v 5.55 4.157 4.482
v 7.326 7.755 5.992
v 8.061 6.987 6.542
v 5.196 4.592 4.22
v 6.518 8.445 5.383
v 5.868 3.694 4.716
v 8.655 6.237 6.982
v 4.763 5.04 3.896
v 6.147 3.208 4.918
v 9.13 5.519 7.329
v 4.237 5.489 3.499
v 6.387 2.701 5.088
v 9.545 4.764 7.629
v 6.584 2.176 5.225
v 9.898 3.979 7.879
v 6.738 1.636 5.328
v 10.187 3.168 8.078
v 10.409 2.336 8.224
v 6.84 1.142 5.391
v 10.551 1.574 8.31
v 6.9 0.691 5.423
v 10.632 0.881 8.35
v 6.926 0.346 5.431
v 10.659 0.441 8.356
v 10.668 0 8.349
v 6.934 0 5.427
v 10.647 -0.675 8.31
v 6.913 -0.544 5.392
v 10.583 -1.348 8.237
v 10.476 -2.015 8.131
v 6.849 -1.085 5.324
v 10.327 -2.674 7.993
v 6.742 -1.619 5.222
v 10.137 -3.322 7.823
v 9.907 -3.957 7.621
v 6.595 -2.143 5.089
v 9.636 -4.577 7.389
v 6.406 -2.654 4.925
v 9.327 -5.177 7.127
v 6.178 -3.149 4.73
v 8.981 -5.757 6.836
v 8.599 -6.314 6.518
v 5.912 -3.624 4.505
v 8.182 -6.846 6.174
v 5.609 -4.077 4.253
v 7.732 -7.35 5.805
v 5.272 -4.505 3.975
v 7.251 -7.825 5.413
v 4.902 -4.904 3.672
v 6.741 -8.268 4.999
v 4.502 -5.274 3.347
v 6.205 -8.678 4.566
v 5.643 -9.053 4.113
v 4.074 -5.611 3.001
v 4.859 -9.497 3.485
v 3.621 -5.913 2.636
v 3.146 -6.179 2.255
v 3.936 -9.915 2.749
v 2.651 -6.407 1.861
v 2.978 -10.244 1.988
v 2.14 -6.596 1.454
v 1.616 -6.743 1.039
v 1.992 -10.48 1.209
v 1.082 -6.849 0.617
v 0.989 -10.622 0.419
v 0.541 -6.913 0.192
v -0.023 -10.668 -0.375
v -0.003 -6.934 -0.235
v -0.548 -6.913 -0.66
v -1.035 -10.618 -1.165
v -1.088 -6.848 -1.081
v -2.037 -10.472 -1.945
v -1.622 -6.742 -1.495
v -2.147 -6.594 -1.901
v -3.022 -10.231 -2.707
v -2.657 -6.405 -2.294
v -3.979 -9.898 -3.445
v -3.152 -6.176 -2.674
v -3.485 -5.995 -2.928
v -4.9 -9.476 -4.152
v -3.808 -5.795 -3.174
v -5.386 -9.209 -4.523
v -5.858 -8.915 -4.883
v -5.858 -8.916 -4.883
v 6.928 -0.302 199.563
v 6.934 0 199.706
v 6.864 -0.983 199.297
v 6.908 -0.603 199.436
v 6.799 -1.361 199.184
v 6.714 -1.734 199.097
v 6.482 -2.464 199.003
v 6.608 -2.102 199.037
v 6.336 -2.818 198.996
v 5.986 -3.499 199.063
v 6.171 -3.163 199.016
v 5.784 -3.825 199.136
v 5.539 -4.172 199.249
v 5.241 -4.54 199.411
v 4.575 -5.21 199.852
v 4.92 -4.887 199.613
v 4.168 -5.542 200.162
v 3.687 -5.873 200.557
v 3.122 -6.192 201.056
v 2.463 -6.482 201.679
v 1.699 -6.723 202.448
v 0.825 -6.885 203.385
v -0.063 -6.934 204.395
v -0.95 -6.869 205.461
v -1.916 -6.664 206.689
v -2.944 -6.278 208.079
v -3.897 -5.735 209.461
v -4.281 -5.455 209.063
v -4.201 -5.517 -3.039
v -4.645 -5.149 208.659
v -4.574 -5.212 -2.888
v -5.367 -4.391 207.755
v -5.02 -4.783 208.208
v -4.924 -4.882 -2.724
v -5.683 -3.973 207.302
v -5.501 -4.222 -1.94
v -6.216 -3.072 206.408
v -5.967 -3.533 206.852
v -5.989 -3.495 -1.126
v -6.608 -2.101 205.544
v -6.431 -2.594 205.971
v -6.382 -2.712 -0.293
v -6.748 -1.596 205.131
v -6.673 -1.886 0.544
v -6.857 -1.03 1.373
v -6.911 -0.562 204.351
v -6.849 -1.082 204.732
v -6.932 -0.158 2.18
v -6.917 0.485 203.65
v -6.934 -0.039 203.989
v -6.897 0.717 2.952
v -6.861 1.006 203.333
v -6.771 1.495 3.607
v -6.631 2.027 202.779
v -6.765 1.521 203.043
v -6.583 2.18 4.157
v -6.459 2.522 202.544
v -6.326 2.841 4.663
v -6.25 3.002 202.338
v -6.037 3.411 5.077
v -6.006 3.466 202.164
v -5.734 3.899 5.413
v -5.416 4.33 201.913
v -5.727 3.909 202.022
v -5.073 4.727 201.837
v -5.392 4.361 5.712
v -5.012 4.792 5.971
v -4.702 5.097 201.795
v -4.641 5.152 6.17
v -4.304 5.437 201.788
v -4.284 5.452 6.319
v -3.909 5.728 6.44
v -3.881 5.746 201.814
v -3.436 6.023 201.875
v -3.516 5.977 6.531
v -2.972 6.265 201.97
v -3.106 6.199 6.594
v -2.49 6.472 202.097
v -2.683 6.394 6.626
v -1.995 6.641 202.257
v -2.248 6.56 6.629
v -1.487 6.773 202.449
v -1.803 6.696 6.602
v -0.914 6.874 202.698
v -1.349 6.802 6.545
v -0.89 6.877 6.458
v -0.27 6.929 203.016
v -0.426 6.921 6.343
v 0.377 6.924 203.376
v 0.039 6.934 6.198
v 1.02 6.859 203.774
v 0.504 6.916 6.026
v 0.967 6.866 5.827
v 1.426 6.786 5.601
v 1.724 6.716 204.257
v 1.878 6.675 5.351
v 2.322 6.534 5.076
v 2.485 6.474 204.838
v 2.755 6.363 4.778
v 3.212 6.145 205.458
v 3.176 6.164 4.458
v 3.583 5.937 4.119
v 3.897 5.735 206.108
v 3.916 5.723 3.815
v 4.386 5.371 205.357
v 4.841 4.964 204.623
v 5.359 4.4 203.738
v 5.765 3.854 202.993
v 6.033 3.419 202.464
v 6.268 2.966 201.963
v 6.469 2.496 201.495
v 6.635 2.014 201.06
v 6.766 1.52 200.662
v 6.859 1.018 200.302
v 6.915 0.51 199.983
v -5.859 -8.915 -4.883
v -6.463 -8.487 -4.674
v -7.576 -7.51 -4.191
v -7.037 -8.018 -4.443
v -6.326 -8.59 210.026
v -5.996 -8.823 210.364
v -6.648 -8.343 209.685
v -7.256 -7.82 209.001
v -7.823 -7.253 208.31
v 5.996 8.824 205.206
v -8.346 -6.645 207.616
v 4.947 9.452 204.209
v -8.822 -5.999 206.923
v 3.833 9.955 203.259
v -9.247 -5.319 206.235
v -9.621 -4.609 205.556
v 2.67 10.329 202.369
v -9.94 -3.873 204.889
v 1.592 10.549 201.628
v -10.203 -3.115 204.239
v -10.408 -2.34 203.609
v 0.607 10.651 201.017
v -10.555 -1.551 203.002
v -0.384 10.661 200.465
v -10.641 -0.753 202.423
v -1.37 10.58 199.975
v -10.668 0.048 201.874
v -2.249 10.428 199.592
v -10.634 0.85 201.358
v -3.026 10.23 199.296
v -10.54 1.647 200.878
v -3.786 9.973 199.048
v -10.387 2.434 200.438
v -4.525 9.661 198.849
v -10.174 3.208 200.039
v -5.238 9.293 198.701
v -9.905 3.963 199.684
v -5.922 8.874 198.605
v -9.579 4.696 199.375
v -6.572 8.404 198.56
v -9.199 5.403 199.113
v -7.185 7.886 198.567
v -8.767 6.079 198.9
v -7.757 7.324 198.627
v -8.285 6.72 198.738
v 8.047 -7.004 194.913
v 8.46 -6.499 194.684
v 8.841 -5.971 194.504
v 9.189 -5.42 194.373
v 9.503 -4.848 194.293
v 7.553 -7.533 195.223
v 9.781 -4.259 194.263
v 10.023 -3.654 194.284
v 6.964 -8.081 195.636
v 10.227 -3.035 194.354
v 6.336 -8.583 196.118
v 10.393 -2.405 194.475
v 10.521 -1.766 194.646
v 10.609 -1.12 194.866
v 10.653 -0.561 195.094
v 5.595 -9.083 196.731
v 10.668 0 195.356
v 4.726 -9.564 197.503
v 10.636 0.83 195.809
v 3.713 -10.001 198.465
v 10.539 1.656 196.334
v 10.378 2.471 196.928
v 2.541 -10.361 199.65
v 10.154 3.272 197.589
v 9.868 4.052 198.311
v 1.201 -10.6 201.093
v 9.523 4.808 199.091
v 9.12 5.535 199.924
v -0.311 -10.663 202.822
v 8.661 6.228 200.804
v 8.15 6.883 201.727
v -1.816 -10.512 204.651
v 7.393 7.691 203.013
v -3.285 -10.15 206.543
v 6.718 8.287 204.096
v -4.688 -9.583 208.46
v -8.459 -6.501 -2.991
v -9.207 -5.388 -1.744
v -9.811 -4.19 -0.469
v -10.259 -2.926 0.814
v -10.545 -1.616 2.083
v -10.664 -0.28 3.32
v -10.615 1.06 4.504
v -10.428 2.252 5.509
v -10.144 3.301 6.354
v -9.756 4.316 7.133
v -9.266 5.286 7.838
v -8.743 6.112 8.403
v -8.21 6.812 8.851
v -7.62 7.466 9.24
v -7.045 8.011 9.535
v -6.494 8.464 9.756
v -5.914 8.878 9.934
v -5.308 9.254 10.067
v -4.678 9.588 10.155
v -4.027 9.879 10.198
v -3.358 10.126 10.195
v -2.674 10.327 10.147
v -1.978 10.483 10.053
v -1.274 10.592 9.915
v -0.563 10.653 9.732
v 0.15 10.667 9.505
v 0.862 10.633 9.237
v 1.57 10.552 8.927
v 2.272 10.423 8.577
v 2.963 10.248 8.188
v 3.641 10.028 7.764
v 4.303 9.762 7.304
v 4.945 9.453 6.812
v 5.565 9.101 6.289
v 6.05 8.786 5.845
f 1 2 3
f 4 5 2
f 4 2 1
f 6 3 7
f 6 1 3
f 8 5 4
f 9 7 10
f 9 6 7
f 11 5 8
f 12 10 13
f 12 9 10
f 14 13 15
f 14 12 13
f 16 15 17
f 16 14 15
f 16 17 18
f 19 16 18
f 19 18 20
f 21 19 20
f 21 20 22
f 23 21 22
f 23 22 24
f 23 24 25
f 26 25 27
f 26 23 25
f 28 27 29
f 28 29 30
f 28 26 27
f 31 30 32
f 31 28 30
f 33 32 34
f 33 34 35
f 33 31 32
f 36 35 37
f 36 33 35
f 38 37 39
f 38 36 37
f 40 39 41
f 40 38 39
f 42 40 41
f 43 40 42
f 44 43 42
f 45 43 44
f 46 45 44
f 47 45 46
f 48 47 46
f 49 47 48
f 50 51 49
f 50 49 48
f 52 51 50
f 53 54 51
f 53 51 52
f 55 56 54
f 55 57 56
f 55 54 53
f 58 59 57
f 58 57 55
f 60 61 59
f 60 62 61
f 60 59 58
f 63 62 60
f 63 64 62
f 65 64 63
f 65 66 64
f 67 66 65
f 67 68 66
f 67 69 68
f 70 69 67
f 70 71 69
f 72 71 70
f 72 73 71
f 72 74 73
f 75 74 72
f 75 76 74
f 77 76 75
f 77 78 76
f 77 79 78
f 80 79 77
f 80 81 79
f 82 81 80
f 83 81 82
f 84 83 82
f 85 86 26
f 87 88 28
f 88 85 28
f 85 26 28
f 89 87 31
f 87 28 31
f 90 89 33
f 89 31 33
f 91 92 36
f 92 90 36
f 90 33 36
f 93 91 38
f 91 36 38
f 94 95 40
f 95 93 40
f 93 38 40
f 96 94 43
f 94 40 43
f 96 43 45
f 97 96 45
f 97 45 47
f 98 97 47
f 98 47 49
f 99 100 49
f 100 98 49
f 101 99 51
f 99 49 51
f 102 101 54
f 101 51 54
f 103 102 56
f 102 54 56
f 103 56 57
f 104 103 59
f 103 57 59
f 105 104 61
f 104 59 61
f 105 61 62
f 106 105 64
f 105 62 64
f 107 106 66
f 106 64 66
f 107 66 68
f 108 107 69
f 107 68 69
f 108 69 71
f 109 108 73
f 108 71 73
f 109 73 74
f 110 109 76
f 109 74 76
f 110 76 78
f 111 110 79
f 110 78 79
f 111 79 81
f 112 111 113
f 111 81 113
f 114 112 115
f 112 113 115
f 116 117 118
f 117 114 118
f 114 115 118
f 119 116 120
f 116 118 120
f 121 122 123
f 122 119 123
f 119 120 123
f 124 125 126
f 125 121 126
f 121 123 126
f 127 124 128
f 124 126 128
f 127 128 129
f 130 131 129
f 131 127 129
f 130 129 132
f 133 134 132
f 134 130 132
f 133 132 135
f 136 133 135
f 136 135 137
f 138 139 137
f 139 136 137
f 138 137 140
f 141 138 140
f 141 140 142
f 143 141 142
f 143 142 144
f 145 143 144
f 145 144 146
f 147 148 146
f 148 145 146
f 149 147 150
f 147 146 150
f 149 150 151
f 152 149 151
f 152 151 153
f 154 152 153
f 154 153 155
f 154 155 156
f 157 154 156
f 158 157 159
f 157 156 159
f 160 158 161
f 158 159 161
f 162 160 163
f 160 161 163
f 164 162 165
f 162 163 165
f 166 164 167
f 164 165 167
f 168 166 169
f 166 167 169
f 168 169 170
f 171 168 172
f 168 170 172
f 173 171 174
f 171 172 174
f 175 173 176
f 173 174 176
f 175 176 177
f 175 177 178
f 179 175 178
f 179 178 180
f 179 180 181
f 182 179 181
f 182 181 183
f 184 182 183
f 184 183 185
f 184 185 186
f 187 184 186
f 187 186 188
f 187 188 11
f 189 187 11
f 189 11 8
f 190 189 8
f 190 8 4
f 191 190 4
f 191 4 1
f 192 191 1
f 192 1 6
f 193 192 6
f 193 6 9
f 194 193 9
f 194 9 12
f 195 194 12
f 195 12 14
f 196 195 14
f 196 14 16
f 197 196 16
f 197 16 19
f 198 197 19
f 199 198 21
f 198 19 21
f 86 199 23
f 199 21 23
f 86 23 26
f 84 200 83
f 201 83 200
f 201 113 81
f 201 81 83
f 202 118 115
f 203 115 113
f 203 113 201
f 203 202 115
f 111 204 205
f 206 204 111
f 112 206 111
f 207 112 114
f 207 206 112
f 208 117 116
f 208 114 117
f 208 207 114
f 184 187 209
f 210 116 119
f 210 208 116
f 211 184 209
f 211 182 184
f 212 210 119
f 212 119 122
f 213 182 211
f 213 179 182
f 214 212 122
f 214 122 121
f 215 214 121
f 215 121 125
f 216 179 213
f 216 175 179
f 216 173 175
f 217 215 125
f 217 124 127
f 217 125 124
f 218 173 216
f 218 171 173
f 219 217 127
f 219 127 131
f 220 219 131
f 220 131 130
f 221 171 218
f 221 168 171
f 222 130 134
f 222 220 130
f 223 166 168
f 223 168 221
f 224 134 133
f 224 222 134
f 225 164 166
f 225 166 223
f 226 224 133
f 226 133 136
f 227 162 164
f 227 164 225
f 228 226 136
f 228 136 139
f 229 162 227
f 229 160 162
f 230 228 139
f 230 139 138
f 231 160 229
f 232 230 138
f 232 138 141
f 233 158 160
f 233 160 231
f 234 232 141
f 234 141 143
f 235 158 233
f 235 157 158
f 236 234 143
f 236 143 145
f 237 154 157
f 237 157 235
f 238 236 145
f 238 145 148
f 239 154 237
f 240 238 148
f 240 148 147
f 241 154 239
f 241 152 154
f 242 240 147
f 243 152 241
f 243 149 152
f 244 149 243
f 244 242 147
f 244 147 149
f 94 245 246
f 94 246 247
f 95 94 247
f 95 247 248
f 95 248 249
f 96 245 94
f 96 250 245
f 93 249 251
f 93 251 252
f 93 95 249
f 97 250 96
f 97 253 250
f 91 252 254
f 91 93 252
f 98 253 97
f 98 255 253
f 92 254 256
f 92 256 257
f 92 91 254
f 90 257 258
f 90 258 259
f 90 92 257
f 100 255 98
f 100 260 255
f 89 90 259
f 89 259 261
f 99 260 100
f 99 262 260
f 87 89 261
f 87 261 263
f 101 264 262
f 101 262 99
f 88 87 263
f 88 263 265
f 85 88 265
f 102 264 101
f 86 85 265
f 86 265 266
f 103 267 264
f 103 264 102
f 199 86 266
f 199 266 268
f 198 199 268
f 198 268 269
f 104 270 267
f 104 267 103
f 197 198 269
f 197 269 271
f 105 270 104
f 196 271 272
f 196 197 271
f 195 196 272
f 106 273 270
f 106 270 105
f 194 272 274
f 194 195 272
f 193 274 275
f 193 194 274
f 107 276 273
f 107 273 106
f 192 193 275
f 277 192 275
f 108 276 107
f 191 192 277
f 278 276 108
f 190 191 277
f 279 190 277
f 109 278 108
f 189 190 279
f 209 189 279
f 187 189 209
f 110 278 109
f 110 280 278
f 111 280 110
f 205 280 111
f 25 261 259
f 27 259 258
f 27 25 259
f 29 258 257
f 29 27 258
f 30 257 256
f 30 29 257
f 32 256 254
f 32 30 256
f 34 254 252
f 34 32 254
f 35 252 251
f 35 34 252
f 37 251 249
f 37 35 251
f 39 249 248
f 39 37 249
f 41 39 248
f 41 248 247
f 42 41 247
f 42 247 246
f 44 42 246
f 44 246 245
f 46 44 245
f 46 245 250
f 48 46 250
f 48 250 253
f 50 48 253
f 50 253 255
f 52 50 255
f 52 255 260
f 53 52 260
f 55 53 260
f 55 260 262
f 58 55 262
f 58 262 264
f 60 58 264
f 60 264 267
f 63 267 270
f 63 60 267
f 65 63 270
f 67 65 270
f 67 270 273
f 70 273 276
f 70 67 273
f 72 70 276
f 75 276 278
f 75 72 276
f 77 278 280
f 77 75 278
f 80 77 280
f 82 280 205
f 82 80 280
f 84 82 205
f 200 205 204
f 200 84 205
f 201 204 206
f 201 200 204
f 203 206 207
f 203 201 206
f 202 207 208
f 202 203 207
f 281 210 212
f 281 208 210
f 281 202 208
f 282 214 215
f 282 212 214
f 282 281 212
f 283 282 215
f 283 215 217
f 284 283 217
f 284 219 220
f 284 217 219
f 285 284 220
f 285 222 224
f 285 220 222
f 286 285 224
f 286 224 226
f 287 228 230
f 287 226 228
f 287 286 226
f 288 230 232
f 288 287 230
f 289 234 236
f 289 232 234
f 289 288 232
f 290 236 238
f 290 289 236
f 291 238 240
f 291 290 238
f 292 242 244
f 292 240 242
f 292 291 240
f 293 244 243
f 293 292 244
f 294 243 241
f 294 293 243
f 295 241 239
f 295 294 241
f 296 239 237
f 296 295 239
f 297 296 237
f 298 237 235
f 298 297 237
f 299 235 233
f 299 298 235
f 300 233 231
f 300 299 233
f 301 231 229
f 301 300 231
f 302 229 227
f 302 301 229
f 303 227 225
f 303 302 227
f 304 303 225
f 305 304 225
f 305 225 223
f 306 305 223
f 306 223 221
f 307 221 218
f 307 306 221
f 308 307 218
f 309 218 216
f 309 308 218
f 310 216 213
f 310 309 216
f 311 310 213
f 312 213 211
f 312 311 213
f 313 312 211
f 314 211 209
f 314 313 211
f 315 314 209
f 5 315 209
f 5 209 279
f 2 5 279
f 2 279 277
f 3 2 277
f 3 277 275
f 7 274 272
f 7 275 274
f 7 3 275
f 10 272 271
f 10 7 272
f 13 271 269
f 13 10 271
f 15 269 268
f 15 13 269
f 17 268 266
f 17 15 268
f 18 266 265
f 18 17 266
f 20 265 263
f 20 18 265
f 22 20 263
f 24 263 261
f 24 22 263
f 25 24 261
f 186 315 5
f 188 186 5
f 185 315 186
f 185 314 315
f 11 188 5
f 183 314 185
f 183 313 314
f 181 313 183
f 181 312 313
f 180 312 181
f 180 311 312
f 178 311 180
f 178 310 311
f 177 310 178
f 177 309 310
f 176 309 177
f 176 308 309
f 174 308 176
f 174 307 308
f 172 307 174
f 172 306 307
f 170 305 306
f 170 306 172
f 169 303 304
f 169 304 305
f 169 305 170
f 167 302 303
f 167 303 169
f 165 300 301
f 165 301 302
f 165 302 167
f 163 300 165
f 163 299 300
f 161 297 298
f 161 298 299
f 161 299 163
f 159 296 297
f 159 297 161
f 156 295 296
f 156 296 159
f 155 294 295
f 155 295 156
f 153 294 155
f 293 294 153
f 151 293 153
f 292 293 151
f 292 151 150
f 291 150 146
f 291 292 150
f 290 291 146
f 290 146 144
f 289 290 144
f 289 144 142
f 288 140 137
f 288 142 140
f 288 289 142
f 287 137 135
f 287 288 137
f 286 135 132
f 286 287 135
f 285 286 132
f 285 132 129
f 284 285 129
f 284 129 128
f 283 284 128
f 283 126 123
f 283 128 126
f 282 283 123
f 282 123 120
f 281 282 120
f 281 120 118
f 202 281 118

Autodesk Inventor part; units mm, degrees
ref_plane "Start Plane" through (0, 0, -4.8828) normal (0, 0, 1) x (1, 0, 0)
ref_plane "End Plane" through (0, 0, 210.3644) normal (0, 0, 1) x (1, 0, 0)
sketch "Sketch" plane through (0, 0, 0) normal (0, 0, 1) x (1, 0, 0)
  circle A0 centre (0, 0) radius 6.9342
  circle A1 centre (0, 0) radius 10.668
  dimension "d0" = 21.336
  dimension "d1" = 3.7338
extrude "Body" add sketch "Sketch" along normal up to surface (215.2472 mm away) from surface at -4.8828
sketch "Sketch3" plane through (0, 0, 0) normal (0, 0, 1) x (1, 0, 0)
  line L0 (0, 0) -> (10, 0)
ref_plane "Work Plane3" through (0, 0, 0) normal (0, -1, 0) x (1, 0, 0)
sketch "Sketch4" plane through (0, 0, 0) normal (0, -1, 0) x (1, 0, 0)
  line L0 (-2, -4.8828) -> (12, -4.8828)
  line L1 (-2, 210.3644) -> (12, 210.3644)
  dimension "d7" = 215.2472
ref_plane "Work Plane4" through (-9.8051, 4.2031, 221.3064) normal (0.7216, -0.3093, 0.6194) x (0.6785, 0.1378, -0.7216)
split "Split1" plane through (-9.8051, 4.2031, 221.3064) removes the side toward (0.7216, -0.3093, 0.6194)
ref_plane "Work Plane5" through (6.7961, -8.2231, 217.0135) normal (-0.4168, 0.5043, 0.7563) x (0.9011, 0.1197, 0.4168)
split "Split2" plane through (6.7961, -8.2231, 217.0135) removes the side toward (-0.4168, 0.5043, 0.7563)
ref_plane "Work Plane6" through (-0.5919, -10.6516, -5.6452) normal (0.026, 0.467, -0.8839) x (0.9942, -0.1044, -0.026)
split "Split3" plane through (-0.5919, -10.6516, -5.6452) removes the side toward (0.026, 0.467, -0.8839)
ref_plane "Work Plane7" through (-10.6583, -0.4551, -8.3573) normal (0.6161, 0.0263, -0.7872) x (-0.7839, -0.0762, -0.6161)
split "Split4" plane through (-10.6583, -0.4551, -8.3573) removes the side toward (0.6161, 0.0263, -0.7872)
ref_plane "Work Plane8" through (3.7346, -9.993, -10.2024) normal (-0.242, 0.6474, -0.7227) x (0.7889, 0.5649, 0.242)
split "Split5" plane through (3.7346, -9.993, -10.2024) removes the side toward (-0.242, 0.6474, -0.7227)
equation "\"d0\" = G_H"
equation "\"d1\" = G_T"
equation "\"d2\" = G_L"
equation "\"G_H\" = 21.336"
equation "\"G_T\" = 3.7338"
equation "\"G_L\" = 215.24718"
equation "\"G_OFFSET_START\" = 4.88279"
equation "\"G_OFFSET_END\" = 2.57893"
equation "\"d4\" = -G_OFFSET_START"
equation "\"d5\" = G_OFFSET_END + B_L"
equation "\"B_L\" = 207.78546"
properties part number "ANSI - 1/2 x 0.147 - 8.474" material "Steel, Mild"
